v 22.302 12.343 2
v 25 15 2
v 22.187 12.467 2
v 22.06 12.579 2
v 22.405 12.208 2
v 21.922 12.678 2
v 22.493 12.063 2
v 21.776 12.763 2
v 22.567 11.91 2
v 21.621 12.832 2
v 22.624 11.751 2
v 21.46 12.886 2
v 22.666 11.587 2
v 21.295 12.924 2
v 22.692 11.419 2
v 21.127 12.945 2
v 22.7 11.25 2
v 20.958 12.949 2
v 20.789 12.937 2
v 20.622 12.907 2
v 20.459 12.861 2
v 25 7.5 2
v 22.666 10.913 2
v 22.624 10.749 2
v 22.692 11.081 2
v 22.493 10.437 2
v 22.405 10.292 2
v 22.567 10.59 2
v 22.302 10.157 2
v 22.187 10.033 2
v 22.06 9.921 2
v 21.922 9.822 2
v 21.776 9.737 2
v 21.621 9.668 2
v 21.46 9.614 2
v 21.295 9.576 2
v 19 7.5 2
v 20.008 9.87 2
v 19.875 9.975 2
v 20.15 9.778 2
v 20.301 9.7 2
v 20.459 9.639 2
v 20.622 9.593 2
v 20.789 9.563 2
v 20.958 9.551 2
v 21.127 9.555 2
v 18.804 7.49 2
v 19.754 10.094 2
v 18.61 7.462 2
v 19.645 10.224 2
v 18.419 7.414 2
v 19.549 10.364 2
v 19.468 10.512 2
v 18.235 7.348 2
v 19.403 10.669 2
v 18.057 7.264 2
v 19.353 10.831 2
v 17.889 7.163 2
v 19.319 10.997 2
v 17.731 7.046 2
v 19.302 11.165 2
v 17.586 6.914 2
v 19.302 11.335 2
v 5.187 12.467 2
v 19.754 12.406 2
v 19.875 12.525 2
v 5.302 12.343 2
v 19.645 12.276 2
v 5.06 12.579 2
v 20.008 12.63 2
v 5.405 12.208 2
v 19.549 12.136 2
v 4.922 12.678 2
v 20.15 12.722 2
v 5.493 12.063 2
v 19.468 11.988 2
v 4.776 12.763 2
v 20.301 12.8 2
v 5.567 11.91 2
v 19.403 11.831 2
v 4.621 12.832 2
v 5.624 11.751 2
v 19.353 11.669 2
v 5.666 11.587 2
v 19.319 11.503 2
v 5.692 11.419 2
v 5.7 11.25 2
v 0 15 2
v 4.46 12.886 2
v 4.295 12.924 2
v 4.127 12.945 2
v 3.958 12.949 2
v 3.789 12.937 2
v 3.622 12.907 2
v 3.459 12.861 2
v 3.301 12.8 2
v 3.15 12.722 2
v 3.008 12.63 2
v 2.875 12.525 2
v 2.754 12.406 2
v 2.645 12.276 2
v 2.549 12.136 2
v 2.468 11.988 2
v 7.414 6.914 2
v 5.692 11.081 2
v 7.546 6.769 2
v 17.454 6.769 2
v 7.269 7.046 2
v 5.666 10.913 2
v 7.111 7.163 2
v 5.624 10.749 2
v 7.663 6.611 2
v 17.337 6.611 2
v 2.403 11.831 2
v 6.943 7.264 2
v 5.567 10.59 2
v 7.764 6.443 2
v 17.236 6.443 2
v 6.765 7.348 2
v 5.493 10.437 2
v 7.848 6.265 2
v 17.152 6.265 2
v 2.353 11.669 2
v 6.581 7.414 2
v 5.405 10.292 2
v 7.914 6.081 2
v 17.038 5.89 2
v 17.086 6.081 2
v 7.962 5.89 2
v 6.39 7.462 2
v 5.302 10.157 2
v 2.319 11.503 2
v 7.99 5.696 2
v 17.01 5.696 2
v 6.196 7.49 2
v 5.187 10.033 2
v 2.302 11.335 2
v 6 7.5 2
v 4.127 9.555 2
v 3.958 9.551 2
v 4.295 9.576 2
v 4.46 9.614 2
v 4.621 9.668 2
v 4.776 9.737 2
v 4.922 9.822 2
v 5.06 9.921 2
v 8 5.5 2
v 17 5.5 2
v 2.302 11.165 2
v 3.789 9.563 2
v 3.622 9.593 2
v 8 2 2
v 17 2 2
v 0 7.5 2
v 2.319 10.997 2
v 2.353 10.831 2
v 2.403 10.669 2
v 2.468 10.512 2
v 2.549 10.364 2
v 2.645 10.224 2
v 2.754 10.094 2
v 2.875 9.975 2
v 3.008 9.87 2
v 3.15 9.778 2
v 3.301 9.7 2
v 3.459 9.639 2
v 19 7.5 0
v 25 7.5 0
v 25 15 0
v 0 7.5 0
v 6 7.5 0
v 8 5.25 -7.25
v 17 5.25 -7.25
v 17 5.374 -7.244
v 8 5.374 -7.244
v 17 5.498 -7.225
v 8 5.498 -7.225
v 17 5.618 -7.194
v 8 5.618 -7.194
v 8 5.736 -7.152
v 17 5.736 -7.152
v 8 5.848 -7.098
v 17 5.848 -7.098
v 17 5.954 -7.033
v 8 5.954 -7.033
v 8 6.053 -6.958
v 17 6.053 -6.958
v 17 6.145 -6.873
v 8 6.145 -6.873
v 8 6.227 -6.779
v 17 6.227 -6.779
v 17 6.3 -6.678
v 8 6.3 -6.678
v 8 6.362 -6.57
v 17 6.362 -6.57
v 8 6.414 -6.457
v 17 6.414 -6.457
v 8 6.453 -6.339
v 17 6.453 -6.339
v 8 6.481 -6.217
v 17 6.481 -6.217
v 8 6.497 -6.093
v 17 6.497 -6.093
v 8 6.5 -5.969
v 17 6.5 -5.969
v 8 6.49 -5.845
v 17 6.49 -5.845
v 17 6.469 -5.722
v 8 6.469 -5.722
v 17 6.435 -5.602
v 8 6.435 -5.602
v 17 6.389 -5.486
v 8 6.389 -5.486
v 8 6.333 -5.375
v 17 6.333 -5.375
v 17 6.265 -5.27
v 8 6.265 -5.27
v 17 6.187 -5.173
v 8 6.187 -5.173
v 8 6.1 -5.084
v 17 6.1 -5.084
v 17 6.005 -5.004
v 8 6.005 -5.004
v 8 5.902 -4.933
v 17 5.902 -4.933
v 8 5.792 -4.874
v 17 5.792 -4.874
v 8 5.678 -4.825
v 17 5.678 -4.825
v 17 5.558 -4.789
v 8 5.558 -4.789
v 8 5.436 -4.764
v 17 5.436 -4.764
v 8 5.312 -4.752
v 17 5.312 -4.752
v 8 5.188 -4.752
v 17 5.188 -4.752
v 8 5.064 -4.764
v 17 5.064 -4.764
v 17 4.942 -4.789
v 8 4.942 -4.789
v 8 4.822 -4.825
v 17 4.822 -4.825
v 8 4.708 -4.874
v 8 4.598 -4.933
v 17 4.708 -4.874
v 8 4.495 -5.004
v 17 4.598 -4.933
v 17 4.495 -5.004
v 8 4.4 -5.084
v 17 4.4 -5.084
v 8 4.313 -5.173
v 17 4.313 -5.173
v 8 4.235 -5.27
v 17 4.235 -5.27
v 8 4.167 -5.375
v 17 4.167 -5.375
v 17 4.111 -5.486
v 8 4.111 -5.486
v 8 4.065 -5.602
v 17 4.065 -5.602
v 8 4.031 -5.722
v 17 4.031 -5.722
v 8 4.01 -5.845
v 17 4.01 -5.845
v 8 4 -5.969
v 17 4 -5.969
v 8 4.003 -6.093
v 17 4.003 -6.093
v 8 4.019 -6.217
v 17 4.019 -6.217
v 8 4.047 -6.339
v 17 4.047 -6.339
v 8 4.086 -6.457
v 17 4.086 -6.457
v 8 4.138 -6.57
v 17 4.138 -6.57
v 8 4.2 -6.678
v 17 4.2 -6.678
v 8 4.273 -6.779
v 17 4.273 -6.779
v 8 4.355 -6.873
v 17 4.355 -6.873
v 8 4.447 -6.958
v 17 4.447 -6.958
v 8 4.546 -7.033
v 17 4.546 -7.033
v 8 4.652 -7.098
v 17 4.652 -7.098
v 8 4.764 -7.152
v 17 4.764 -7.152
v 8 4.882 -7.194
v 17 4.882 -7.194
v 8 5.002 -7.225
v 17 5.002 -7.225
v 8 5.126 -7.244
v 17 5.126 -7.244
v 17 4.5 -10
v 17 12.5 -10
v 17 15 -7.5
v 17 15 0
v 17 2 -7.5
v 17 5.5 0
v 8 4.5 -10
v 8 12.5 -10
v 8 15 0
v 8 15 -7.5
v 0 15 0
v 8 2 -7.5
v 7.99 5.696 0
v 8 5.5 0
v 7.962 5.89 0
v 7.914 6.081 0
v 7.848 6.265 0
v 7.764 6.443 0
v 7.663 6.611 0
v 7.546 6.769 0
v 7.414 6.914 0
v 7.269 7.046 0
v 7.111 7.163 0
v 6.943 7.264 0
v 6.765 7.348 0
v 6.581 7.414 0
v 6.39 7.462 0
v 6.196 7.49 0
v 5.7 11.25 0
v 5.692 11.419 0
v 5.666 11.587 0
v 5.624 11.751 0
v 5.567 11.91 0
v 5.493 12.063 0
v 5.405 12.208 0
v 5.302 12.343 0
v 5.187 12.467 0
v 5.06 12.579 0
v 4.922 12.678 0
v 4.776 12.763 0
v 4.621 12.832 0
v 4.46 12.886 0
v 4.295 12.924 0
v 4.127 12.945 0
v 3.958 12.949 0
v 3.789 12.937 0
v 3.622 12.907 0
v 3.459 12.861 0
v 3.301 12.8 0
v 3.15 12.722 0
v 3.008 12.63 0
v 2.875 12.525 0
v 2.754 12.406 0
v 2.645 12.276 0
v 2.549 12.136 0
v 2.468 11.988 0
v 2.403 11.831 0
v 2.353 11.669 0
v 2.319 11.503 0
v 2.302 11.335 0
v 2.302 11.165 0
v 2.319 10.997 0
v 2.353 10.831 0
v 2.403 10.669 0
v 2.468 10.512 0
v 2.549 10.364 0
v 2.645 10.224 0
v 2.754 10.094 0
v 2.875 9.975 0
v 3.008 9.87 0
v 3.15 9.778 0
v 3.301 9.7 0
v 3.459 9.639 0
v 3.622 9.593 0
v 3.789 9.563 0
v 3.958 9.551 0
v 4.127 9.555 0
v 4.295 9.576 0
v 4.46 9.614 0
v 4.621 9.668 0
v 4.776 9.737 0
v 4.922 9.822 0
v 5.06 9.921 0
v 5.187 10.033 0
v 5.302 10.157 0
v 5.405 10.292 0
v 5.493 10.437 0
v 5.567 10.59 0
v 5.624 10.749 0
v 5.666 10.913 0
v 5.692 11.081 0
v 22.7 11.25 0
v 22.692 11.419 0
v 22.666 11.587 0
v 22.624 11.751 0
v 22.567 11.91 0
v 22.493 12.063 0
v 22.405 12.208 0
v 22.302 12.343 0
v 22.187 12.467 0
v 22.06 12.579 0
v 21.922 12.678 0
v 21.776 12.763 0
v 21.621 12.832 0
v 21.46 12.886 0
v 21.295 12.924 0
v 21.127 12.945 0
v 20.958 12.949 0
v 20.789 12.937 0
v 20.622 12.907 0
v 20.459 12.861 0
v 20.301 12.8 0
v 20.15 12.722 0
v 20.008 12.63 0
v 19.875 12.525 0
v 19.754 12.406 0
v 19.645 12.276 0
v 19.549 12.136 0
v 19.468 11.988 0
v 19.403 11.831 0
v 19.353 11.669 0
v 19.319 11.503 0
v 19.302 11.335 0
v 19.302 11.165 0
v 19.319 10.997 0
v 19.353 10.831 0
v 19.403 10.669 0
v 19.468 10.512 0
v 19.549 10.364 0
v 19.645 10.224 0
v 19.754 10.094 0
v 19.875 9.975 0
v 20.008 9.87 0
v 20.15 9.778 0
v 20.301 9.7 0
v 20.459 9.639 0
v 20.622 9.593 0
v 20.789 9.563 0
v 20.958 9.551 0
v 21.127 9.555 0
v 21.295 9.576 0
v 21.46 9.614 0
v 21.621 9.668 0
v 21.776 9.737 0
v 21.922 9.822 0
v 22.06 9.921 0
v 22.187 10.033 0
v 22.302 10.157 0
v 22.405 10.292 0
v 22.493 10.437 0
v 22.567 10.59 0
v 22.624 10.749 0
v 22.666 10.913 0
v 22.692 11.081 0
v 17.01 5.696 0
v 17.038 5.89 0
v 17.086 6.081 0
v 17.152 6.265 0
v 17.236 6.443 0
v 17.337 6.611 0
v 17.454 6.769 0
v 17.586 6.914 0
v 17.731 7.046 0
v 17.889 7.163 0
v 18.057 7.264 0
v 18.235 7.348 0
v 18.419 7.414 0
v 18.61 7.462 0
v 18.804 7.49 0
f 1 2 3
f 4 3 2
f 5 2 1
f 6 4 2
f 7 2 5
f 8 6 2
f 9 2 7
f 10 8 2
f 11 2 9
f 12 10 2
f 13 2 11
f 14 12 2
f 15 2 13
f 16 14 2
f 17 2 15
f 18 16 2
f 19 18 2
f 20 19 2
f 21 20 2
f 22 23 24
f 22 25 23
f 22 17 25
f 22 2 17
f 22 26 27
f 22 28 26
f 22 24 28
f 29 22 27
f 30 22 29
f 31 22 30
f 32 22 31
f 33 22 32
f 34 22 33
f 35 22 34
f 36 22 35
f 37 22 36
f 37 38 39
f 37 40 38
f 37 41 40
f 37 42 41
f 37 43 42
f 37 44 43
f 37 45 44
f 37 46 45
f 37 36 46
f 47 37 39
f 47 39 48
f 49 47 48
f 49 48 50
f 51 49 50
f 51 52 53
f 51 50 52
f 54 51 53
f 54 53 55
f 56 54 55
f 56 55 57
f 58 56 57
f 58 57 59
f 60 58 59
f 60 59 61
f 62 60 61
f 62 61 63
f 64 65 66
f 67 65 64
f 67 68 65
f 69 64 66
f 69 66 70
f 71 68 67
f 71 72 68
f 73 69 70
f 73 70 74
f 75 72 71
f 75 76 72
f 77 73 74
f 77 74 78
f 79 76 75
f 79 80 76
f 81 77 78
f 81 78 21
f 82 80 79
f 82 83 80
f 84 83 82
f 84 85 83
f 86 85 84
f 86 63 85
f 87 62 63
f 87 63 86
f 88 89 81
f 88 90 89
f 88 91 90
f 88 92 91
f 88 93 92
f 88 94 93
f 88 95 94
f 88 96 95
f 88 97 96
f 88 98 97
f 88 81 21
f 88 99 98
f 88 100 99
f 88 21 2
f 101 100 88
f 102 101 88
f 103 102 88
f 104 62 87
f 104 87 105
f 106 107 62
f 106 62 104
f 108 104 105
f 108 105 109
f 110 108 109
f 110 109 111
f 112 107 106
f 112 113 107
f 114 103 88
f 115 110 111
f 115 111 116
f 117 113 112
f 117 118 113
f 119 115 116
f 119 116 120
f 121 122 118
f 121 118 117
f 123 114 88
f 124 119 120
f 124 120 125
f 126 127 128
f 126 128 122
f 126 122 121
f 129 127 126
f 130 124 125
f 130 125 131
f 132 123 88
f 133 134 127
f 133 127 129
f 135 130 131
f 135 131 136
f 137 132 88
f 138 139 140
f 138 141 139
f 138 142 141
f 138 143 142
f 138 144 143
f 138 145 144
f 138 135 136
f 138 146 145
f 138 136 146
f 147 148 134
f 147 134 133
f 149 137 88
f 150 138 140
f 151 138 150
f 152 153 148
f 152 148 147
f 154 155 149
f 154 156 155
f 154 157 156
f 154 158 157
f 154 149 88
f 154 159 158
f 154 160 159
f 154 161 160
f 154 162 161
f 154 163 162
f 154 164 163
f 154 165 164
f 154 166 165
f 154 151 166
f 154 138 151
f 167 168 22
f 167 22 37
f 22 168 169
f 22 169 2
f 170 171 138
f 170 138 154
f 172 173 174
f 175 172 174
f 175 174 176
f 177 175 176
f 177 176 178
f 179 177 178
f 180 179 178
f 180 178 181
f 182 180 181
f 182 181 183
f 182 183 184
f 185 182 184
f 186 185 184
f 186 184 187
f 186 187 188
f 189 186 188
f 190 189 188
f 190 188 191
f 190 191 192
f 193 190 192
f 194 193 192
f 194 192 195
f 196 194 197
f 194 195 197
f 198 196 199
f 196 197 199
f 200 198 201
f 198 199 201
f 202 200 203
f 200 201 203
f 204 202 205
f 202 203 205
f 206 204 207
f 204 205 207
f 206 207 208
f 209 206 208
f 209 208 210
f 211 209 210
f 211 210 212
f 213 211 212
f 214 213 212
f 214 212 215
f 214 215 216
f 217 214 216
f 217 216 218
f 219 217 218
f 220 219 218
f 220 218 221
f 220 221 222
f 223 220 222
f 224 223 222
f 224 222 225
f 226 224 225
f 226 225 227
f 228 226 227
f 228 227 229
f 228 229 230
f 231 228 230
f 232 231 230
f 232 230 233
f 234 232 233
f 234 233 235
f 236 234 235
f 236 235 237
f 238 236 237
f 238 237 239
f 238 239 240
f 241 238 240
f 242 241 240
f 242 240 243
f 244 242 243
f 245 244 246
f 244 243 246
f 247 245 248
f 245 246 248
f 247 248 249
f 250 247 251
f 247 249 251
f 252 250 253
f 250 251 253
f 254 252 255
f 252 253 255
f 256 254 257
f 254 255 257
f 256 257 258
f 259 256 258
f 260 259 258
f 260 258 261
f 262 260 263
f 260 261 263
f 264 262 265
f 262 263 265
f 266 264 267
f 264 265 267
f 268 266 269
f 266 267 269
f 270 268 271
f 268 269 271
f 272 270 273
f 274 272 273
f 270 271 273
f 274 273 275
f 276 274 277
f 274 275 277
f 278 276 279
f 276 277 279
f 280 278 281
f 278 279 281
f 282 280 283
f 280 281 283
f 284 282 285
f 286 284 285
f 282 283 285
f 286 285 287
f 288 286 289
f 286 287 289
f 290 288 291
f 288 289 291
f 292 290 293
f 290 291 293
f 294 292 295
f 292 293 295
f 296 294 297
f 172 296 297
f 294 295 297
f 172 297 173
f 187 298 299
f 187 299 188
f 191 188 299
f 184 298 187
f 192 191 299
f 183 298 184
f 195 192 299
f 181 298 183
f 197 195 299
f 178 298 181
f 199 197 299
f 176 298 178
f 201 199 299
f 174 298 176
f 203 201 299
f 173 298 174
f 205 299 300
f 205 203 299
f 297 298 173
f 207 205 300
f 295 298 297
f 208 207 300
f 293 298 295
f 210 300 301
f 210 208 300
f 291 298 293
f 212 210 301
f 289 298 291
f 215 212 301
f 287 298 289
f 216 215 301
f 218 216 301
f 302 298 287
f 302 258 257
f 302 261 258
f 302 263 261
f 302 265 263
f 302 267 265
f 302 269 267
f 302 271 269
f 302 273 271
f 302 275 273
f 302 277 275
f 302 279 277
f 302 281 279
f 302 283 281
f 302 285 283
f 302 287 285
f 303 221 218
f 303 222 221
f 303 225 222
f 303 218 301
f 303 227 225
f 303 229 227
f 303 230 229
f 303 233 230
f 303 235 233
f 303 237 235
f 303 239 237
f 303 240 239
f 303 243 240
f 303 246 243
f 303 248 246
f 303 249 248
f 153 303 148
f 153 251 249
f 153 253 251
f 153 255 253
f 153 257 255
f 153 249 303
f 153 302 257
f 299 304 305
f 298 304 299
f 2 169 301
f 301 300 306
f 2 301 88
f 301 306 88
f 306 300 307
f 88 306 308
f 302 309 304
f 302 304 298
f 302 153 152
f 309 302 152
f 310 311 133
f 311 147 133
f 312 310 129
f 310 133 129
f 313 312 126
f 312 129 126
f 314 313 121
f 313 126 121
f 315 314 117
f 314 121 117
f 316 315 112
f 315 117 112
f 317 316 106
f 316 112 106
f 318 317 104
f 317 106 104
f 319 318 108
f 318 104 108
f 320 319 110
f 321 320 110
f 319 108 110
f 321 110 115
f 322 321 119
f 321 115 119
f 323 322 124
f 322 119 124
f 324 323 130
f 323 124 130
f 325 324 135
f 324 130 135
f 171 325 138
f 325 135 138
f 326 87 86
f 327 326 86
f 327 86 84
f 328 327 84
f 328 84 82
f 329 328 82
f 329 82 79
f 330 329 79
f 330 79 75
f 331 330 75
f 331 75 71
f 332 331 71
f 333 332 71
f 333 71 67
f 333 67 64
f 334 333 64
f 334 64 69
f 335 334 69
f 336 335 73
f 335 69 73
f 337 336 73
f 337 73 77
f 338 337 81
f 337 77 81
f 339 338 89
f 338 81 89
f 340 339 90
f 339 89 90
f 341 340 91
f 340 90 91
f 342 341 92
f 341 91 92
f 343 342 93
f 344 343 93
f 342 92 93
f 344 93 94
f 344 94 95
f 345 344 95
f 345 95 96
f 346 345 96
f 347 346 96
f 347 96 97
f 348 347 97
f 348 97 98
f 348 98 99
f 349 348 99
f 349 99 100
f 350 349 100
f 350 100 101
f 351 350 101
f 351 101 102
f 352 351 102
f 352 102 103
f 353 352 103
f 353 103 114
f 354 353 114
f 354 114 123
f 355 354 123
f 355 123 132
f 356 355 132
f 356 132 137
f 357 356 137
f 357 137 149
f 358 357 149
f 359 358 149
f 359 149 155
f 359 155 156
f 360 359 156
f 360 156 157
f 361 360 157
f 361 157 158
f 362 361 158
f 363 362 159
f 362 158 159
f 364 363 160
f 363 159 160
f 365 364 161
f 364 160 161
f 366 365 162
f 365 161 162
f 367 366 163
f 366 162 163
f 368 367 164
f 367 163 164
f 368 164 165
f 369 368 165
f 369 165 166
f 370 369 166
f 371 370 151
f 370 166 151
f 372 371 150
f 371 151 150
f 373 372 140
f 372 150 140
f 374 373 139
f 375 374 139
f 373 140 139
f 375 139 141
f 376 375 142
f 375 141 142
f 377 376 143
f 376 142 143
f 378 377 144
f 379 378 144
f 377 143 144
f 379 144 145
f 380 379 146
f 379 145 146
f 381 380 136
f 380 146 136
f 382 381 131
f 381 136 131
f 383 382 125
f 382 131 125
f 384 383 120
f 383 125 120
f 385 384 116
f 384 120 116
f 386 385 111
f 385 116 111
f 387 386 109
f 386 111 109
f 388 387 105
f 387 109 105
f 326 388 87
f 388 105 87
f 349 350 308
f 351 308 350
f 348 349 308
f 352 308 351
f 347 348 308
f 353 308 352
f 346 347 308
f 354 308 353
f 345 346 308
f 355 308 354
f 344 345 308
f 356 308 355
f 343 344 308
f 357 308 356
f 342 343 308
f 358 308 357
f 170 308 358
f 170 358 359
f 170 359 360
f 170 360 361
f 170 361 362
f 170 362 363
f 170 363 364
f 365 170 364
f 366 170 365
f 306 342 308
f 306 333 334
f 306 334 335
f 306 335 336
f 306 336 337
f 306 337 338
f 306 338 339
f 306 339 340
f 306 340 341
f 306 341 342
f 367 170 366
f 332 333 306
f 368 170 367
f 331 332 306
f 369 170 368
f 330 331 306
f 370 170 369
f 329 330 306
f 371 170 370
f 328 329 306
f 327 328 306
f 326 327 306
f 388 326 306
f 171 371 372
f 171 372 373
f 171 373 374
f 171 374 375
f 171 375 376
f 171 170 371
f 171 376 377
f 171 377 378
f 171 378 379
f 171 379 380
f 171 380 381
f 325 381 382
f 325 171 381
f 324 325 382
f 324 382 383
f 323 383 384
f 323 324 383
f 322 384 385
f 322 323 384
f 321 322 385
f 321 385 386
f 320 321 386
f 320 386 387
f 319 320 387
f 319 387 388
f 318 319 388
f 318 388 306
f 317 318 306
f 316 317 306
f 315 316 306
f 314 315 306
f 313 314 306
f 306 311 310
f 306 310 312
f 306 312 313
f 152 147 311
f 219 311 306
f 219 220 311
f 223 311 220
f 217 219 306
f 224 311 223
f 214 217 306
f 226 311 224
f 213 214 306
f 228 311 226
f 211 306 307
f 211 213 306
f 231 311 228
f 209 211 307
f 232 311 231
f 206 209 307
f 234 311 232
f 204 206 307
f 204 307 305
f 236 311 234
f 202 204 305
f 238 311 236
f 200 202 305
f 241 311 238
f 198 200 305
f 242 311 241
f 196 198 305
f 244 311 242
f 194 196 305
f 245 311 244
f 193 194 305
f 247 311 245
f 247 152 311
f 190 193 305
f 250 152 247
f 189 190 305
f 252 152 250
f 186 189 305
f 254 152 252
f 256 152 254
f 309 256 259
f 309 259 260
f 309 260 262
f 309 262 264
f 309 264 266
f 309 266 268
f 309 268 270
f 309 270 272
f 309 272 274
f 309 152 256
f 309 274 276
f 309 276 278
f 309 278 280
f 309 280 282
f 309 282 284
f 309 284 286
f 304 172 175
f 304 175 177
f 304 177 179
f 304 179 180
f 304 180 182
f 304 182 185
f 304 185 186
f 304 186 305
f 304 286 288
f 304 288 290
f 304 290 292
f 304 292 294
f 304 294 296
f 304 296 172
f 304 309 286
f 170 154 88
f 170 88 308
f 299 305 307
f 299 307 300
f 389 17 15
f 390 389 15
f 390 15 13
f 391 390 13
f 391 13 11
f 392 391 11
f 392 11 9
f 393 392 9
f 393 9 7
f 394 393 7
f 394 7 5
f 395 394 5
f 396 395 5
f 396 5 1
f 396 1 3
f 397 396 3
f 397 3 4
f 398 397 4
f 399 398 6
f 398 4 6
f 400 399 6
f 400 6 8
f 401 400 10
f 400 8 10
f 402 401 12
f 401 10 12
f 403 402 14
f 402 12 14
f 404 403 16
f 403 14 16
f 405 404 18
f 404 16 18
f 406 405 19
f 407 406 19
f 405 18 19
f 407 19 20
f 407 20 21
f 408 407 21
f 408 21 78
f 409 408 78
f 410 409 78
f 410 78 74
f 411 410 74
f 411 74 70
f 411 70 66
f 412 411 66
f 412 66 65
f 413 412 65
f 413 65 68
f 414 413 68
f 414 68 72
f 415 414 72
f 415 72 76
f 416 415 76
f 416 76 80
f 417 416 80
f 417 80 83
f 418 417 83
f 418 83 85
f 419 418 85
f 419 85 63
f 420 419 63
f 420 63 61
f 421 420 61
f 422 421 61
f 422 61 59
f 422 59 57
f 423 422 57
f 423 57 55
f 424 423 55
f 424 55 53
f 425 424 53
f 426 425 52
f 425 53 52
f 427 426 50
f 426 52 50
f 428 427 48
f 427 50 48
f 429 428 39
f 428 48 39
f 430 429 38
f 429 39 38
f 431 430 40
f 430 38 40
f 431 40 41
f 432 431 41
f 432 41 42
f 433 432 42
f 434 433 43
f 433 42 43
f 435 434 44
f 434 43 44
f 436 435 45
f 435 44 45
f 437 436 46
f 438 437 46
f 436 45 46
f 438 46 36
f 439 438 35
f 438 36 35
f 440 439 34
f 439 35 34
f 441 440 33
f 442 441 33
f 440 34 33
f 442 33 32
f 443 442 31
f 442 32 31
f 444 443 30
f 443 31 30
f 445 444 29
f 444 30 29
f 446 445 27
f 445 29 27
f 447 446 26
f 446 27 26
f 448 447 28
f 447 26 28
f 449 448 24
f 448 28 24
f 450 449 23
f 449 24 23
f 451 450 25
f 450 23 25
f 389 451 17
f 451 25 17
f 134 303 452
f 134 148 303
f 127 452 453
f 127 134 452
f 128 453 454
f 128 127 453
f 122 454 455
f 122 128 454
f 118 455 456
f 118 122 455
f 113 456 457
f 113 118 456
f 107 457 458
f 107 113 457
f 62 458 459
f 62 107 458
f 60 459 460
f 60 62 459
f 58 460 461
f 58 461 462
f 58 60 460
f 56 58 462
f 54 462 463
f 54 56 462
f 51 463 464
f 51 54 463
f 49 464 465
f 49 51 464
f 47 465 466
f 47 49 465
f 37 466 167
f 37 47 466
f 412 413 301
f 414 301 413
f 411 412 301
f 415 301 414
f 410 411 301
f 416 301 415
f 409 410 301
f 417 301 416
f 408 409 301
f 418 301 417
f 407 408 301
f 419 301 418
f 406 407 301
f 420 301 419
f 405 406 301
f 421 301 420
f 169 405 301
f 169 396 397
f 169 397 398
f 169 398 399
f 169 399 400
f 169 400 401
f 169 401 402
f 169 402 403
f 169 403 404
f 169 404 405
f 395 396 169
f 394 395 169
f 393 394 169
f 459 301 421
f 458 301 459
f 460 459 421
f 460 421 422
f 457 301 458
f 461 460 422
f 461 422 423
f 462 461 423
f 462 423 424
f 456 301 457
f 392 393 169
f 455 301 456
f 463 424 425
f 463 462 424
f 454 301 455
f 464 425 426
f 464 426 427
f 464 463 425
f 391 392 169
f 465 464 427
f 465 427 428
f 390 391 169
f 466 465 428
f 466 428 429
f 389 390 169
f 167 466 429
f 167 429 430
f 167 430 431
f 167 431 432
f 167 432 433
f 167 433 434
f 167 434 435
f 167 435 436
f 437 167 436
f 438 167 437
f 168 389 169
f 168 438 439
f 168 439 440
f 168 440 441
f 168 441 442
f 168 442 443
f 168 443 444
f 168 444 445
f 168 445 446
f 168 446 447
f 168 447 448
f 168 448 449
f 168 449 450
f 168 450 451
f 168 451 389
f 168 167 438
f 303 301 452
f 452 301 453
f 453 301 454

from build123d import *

# Parameters (mm, degrees)
BOSS_EXTRUDE1_DEPTH         = 15
CUT_EXTRUDE2_DEPTH          = 11
CUT_EXTRUDE2_DEPTH_BACK     = 3
M3_CLEARANCE_HOLE1_D        = 3.4
M3_CLEARANCE_HOLE1_DEPTH    = 3.9
M3_CLEARANCE_HOLE1_TIP      = 1.021463052
TAP_DRILL_FOR_M3X0_5_TAP1_D = 2.5
CHAMFER2_SIZE               = 2.5
FILLET1_R                   = 2


with BuildPart() as part:
    # Sketch1 → Boss-Extrude1 (new body)
    with BuildSketch(Plane(origin=(0, 0, 0), x_dir=(1, 0, 0), z_dir=(0, 1, 0))):
        Polygon((0, 0), (8, 0), (8, 10), (17, 10), (17, 0), (25, 0), (25, -2), (0, -2), align=None)
    extrude(amount=BOSS_EXTRUDE1_DEPTH)

    # Sketch5 → Cut-Extrude2 (cut, two sides)
    with BuildSketch(Plane(origin=(0, 0, 0), x_dir=(-1, 0, 0), z_dir=(0, 0, -1))) as cut_extrude2_sk:
        Polygon((-25, 7.5), (-17, 7.5), (-17, 2), (-8, 2), (-8, 7.5), (0, 7.5), (0, 0), (-8, 0), (-17, 0), (-25, 0), align=None)
    extrude(amount=CUT_EXTRUDE2_DEPTH, mode=Mode.SUBTRACT)
    extrude(cut_extrude2_sk.sketch, amount=-CUT_EXTRUDE2_DEPTH_BACK, mode=Mode.SUBTRACT)

    # M3 Clearance Hole1
    with Locations(Plane(origin=(0, 0, 0), x_dir=(-1, 0, 0), z_dir=(0, 0, -1))):
        with Locations((-4, 11.25), (-21, 11.25)):
            Hole(M3_CLEARANCE_HOLE1_D / 2, depth=M3_CLEARANCE_HOLE1_DEPTH)
            with Locations((0, 0, -(M3_CLEARANCE_HOLE1_DEPTH + M3_CLEARANCE_HOLE1_TIP / 2))):  # 118° drill point
                Cone(0, M3_CLEARANCE_HOLE1_D / 2, M3_CLEARANCE_HOLE1_TIP, mode=Mode.SUBTRACT)

    # Tap Drill for M3x0.5 Tap1 (through all)
    with Locations(Plane.ZY.offset(-8)):
        with Locations((-6, 5.25)):
            Hole(TAP_DRILL_FOR_M3X0_5_TAP1_D / 2)

    # Chamfer2
    chamfer2_edges = [part.edges().sort_by_distance(p)[0] for p in [
        (12.5, 15, -10),
        (12.5, 2, -10),
    ]]
    chamfer(chamfer2_edges, length=CHAMFER2_SIZE)

    # Fillet1
    fillet1_edges = [part.edges().sort_by_distance(p)[0] for p in [
        (17, 7.5, 1),
        (8, 7.5, 1),
    ]]
    fillet(fillet1_edges, radius=FILLET1_R)


solid = part.part
